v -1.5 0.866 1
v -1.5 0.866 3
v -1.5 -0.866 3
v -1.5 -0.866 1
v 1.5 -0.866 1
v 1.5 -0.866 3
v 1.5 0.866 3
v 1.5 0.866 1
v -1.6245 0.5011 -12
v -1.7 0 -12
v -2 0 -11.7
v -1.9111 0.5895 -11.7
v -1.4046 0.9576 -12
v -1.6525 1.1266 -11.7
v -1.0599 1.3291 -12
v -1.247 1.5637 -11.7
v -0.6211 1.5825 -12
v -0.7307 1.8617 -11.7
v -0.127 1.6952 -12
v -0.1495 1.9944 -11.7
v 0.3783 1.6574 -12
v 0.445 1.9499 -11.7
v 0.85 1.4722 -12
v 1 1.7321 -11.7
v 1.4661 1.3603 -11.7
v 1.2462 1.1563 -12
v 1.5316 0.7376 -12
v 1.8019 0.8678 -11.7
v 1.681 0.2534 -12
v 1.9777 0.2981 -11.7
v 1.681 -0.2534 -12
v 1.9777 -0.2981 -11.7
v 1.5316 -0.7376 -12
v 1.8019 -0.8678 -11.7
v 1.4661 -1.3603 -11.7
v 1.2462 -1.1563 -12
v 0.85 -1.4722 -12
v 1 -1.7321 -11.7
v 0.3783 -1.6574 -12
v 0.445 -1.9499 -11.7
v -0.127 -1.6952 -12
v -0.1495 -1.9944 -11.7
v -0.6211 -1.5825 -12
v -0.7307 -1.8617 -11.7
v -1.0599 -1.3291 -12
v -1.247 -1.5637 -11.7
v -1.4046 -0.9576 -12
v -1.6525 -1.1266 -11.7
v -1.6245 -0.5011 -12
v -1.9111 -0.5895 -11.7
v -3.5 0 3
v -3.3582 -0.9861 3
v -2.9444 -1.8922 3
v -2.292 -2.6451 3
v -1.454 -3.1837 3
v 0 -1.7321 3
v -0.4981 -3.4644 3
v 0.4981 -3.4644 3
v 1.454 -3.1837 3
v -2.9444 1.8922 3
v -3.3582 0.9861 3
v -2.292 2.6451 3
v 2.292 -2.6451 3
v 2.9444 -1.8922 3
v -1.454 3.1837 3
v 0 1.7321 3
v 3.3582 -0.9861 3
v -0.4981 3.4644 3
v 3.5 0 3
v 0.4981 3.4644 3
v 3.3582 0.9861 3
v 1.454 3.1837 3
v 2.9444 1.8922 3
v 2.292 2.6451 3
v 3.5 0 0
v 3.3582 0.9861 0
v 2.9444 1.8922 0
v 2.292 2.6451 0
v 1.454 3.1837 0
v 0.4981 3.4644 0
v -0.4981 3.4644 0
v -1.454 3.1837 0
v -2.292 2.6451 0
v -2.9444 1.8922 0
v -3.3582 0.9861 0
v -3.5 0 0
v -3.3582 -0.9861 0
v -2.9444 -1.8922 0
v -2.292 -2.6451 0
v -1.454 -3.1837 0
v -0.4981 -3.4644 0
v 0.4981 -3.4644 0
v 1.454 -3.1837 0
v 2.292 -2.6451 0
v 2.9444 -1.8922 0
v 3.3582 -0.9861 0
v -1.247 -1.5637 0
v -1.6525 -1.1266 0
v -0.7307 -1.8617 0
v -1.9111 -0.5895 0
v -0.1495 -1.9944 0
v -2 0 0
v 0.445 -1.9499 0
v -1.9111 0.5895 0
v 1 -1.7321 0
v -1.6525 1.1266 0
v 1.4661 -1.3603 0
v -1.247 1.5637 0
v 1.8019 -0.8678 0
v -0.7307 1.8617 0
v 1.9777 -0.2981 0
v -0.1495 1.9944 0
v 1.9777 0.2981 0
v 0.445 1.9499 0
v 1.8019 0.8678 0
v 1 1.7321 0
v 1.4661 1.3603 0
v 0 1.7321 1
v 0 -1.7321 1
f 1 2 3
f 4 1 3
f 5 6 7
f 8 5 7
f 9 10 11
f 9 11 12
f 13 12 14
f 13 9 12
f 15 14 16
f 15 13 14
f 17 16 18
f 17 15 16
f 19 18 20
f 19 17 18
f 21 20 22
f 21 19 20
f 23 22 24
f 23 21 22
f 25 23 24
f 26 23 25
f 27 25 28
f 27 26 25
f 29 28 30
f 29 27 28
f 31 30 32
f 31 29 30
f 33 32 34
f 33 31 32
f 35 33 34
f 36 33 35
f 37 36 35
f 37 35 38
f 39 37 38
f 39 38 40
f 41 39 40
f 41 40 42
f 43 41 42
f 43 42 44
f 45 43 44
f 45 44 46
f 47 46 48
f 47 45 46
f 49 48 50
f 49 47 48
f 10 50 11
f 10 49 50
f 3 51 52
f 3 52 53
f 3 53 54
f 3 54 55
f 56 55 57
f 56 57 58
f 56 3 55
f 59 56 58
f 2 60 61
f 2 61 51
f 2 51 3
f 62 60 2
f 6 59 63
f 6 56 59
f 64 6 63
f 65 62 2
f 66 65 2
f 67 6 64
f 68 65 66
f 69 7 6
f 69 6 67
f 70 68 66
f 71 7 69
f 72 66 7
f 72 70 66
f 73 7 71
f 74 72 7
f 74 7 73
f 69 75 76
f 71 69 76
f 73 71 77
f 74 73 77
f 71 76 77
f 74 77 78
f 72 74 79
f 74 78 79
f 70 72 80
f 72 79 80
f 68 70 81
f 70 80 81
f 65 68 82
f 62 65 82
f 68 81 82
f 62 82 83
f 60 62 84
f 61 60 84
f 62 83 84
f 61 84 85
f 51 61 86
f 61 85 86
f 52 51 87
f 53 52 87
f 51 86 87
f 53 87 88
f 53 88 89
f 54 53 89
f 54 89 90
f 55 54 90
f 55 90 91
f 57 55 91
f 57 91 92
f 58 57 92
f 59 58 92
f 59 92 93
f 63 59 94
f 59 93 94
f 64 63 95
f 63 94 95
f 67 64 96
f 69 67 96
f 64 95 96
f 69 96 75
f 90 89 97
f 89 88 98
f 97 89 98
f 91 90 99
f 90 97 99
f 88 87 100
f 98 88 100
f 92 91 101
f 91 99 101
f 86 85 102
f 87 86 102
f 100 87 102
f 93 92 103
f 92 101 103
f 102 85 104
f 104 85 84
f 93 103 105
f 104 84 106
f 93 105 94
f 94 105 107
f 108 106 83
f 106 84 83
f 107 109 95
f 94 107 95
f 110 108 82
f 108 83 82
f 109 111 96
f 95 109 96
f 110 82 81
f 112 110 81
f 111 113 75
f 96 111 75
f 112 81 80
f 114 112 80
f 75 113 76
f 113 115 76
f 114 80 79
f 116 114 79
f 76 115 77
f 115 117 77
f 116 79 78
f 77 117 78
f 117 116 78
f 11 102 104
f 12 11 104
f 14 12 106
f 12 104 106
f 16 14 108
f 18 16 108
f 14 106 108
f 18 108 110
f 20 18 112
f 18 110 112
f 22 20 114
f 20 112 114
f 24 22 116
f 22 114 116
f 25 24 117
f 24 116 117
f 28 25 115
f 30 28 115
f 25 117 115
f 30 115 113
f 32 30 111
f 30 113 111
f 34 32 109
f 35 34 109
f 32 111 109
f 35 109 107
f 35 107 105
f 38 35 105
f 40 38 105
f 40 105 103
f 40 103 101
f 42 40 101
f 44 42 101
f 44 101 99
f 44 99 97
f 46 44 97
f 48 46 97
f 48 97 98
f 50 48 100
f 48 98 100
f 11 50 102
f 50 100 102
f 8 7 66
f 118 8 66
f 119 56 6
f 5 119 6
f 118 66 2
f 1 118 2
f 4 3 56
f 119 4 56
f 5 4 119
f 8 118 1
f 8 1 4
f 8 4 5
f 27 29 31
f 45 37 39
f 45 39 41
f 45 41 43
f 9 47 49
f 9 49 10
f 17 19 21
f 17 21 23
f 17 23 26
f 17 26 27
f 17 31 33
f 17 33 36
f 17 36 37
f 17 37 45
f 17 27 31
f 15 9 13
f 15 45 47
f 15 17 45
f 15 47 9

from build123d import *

# Parameters (mm, degrees)
SKETCH1_R           = 3.5
BOSS_EXTRUDE1_DEPTH = 3
SKETCH2_R           = 2
BOSS_EXTRUDE2_DEPTH = 12
CHAMFER1_SIZE       = 0.3
CUT_EXTRUDE1_DEPTH  = 2


with BuildPart() as part:
    # Sketch1 → Boss-Extrude1 (new body)
    with BuildSketch(Plane.XY):
        Circle(SKETCH1_R)
    extrude(amount=BOSS_EXTRUDE1_DEPTH)

    # Sketch2 → Boss-Extrude2 (add)
    with BuildSketch(Plane(origin=(0, 0, 0), x_dir=(-1, 0, 0), z_dir=(0, 0, -1))):
        Circle(SKETCH2_R)
    extrude(amount=BOSS_EXTRUDE2_DEPTH)

    # Chamfer1
    chamfer1_edges = [part.edges().sort_by_distance(p)[0] for p in [
        (2, 0, -12),
    ]]
    chamfer(chamfer1_edges, length=CHAMFER1_SIZE)

    # Sketch3 → Cut-Extrude1 (cut)
    with BuildSketch(Plane.XY.offset(3)):
        Polygon((0, 1.732050808), (-1.5, 0.866025404), (-1.5, -0.866025404), (0, -1.732050808), (1.5, -0.866025404), (1.5, 0.866025404), align=None)
    extrude(amount=-CUT_EXTRUDE1_DEPTH, mode=Mode.SUBTRACT)


solid = part.part
